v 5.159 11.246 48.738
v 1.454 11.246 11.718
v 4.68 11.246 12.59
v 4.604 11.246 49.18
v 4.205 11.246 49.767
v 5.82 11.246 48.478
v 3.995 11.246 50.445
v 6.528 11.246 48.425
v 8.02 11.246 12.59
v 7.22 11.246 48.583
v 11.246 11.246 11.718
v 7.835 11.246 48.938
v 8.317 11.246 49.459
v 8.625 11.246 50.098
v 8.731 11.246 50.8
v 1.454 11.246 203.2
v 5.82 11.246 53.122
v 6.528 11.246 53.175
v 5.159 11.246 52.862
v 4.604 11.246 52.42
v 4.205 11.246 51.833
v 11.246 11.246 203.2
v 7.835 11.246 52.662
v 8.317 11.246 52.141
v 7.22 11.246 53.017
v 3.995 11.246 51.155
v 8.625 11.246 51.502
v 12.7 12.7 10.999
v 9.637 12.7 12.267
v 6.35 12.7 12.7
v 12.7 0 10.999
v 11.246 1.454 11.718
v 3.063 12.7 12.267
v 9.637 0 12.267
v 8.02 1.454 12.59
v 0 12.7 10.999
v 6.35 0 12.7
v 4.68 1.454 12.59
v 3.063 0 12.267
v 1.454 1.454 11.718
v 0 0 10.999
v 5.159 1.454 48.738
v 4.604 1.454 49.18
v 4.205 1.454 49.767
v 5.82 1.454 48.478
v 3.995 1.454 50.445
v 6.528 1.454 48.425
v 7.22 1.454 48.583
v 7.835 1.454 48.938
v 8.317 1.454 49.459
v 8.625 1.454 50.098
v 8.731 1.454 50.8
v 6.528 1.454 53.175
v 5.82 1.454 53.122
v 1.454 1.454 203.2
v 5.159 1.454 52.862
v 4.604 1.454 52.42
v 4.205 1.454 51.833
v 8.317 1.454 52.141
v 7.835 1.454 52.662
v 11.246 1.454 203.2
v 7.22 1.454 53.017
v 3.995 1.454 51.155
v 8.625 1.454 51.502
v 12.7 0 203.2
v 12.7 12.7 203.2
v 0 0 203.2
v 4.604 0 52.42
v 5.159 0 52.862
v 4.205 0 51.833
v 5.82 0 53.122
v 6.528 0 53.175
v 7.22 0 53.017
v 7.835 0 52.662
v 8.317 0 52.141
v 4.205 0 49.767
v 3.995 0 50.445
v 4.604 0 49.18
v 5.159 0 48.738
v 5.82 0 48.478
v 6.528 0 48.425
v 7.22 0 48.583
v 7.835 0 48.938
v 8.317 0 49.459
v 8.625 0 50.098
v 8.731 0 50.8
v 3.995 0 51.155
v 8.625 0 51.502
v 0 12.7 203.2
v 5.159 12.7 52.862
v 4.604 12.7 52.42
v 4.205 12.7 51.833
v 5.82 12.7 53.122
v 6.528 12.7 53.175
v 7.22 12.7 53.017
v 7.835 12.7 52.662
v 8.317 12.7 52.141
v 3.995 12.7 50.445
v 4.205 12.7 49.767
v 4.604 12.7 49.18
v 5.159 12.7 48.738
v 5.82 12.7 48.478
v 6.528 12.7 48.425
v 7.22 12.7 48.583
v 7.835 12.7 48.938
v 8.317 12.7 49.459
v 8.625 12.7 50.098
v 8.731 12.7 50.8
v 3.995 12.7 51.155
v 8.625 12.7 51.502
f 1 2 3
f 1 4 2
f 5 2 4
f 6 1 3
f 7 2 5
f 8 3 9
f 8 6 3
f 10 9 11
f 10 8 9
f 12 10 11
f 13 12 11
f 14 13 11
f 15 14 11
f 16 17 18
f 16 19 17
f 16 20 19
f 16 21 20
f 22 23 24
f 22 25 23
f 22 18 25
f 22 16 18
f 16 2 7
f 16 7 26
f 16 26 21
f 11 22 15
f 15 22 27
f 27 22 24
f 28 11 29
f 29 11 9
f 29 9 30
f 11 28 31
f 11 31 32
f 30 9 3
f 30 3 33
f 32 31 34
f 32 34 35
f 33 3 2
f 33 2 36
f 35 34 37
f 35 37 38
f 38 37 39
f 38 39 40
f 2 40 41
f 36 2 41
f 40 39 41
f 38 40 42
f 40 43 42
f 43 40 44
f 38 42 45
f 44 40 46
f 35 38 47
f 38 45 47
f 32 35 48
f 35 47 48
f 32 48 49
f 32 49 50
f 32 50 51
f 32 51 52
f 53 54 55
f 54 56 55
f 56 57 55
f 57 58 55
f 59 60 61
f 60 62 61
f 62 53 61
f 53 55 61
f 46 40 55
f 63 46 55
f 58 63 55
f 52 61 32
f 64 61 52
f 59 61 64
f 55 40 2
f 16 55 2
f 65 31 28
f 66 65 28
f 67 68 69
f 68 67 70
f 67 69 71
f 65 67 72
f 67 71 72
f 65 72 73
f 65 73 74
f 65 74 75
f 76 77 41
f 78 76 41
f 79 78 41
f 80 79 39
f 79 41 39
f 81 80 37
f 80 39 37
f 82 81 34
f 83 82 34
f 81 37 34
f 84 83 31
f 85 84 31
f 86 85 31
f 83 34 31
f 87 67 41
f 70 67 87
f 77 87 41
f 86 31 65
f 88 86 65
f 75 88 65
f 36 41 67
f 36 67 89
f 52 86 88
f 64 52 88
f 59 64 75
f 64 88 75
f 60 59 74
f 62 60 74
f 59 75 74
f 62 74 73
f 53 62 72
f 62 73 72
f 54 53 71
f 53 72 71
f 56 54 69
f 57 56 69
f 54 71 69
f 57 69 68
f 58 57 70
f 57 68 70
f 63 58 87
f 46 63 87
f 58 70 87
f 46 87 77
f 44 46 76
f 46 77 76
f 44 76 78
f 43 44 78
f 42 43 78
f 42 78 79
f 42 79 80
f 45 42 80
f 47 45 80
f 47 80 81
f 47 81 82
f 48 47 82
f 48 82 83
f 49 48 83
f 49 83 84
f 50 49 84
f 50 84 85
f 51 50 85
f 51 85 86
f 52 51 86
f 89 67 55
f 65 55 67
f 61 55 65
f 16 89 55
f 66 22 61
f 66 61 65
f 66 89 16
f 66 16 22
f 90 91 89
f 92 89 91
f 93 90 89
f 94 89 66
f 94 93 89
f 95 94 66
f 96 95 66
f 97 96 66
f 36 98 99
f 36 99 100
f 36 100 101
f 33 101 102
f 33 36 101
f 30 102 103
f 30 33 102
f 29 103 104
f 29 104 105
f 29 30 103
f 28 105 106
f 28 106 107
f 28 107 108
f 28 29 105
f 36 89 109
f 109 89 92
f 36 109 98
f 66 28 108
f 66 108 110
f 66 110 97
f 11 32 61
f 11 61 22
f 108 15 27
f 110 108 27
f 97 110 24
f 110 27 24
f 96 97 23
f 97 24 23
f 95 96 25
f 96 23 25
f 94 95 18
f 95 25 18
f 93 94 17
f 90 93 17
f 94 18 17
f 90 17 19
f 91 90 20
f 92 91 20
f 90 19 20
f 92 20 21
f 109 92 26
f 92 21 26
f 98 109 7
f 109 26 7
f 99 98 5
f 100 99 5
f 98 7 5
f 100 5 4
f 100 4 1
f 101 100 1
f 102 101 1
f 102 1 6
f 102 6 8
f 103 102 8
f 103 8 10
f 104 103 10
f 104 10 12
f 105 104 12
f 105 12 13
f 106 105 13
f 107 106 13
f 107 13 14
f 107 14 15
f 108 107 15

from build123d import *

# Parameters (mm, degrees)
F0_W     = 12.7
F0_H     = 12.7
F1_DEPTH = 203.2
F3_DEPTH = 25.4
F4_W     = 9.7917
F4_H     = 9.7917
F5_DEPTH = 254
F6_R     = 2.38125
F7_DEPTH = 25.4


with BuildPart() as f1:
    # F0 (on Top) → F1 (new body)
    with BuildSketch(Plane.XY):
        with Locations((6.35, 6.35)):
            Rectangle(F0_W, F0_H)
    extrude(amount=F1_DEPTH)

    # F2 (on face) → F3 (cut)
    with BuildSketch(Plane.XZ):
        with BuildLine():
            ThreePointArc((0, 10.998523), (0, -10.998523), (19.05, 0))
            ThreePointArc((19.05, 0), (17.348523, 6.35), (12.7, 10.998523))
            Line((12.7, 10.998523), (12.7, 0))
            Line((12.7, 0), (0, 0))
            Line((0, 0), (0, 10.998523))
        make_face()
        with BuildLine():
            Line((12.7, 0), (12.7, 10.998523))
            ThreePointArc((12.7, 10.998523), (6.35, 12.7), (0, 10.998523))
            Line((0, 10.998523), (0, 0))
            Line((0, 0), (12.7, 0))
        make_face()
    extrude(amount=-F3_DEPTH, mode=Mode.SUBTRACT)

    # F4 (on face) → F5 (cut)
    with BuildSketch(Plane.XY.offset(203.2)):
        with Locations((6.35, 6.35)):
            Rectangle(F4_W, F4_H)
    extrude(amount=-F5_DEPTH, mode=Mode.SUBTRACT)

    # F6 (on face) → F7 (cut)
    with BuildSketch(Plane.XZ):
        with Locations((6.35, 50.8)):
            Circle(F6_R)
    extrude(amount=-F7_DEPTH, mode=Mode.SUBTRACT)


solid = f1.part
